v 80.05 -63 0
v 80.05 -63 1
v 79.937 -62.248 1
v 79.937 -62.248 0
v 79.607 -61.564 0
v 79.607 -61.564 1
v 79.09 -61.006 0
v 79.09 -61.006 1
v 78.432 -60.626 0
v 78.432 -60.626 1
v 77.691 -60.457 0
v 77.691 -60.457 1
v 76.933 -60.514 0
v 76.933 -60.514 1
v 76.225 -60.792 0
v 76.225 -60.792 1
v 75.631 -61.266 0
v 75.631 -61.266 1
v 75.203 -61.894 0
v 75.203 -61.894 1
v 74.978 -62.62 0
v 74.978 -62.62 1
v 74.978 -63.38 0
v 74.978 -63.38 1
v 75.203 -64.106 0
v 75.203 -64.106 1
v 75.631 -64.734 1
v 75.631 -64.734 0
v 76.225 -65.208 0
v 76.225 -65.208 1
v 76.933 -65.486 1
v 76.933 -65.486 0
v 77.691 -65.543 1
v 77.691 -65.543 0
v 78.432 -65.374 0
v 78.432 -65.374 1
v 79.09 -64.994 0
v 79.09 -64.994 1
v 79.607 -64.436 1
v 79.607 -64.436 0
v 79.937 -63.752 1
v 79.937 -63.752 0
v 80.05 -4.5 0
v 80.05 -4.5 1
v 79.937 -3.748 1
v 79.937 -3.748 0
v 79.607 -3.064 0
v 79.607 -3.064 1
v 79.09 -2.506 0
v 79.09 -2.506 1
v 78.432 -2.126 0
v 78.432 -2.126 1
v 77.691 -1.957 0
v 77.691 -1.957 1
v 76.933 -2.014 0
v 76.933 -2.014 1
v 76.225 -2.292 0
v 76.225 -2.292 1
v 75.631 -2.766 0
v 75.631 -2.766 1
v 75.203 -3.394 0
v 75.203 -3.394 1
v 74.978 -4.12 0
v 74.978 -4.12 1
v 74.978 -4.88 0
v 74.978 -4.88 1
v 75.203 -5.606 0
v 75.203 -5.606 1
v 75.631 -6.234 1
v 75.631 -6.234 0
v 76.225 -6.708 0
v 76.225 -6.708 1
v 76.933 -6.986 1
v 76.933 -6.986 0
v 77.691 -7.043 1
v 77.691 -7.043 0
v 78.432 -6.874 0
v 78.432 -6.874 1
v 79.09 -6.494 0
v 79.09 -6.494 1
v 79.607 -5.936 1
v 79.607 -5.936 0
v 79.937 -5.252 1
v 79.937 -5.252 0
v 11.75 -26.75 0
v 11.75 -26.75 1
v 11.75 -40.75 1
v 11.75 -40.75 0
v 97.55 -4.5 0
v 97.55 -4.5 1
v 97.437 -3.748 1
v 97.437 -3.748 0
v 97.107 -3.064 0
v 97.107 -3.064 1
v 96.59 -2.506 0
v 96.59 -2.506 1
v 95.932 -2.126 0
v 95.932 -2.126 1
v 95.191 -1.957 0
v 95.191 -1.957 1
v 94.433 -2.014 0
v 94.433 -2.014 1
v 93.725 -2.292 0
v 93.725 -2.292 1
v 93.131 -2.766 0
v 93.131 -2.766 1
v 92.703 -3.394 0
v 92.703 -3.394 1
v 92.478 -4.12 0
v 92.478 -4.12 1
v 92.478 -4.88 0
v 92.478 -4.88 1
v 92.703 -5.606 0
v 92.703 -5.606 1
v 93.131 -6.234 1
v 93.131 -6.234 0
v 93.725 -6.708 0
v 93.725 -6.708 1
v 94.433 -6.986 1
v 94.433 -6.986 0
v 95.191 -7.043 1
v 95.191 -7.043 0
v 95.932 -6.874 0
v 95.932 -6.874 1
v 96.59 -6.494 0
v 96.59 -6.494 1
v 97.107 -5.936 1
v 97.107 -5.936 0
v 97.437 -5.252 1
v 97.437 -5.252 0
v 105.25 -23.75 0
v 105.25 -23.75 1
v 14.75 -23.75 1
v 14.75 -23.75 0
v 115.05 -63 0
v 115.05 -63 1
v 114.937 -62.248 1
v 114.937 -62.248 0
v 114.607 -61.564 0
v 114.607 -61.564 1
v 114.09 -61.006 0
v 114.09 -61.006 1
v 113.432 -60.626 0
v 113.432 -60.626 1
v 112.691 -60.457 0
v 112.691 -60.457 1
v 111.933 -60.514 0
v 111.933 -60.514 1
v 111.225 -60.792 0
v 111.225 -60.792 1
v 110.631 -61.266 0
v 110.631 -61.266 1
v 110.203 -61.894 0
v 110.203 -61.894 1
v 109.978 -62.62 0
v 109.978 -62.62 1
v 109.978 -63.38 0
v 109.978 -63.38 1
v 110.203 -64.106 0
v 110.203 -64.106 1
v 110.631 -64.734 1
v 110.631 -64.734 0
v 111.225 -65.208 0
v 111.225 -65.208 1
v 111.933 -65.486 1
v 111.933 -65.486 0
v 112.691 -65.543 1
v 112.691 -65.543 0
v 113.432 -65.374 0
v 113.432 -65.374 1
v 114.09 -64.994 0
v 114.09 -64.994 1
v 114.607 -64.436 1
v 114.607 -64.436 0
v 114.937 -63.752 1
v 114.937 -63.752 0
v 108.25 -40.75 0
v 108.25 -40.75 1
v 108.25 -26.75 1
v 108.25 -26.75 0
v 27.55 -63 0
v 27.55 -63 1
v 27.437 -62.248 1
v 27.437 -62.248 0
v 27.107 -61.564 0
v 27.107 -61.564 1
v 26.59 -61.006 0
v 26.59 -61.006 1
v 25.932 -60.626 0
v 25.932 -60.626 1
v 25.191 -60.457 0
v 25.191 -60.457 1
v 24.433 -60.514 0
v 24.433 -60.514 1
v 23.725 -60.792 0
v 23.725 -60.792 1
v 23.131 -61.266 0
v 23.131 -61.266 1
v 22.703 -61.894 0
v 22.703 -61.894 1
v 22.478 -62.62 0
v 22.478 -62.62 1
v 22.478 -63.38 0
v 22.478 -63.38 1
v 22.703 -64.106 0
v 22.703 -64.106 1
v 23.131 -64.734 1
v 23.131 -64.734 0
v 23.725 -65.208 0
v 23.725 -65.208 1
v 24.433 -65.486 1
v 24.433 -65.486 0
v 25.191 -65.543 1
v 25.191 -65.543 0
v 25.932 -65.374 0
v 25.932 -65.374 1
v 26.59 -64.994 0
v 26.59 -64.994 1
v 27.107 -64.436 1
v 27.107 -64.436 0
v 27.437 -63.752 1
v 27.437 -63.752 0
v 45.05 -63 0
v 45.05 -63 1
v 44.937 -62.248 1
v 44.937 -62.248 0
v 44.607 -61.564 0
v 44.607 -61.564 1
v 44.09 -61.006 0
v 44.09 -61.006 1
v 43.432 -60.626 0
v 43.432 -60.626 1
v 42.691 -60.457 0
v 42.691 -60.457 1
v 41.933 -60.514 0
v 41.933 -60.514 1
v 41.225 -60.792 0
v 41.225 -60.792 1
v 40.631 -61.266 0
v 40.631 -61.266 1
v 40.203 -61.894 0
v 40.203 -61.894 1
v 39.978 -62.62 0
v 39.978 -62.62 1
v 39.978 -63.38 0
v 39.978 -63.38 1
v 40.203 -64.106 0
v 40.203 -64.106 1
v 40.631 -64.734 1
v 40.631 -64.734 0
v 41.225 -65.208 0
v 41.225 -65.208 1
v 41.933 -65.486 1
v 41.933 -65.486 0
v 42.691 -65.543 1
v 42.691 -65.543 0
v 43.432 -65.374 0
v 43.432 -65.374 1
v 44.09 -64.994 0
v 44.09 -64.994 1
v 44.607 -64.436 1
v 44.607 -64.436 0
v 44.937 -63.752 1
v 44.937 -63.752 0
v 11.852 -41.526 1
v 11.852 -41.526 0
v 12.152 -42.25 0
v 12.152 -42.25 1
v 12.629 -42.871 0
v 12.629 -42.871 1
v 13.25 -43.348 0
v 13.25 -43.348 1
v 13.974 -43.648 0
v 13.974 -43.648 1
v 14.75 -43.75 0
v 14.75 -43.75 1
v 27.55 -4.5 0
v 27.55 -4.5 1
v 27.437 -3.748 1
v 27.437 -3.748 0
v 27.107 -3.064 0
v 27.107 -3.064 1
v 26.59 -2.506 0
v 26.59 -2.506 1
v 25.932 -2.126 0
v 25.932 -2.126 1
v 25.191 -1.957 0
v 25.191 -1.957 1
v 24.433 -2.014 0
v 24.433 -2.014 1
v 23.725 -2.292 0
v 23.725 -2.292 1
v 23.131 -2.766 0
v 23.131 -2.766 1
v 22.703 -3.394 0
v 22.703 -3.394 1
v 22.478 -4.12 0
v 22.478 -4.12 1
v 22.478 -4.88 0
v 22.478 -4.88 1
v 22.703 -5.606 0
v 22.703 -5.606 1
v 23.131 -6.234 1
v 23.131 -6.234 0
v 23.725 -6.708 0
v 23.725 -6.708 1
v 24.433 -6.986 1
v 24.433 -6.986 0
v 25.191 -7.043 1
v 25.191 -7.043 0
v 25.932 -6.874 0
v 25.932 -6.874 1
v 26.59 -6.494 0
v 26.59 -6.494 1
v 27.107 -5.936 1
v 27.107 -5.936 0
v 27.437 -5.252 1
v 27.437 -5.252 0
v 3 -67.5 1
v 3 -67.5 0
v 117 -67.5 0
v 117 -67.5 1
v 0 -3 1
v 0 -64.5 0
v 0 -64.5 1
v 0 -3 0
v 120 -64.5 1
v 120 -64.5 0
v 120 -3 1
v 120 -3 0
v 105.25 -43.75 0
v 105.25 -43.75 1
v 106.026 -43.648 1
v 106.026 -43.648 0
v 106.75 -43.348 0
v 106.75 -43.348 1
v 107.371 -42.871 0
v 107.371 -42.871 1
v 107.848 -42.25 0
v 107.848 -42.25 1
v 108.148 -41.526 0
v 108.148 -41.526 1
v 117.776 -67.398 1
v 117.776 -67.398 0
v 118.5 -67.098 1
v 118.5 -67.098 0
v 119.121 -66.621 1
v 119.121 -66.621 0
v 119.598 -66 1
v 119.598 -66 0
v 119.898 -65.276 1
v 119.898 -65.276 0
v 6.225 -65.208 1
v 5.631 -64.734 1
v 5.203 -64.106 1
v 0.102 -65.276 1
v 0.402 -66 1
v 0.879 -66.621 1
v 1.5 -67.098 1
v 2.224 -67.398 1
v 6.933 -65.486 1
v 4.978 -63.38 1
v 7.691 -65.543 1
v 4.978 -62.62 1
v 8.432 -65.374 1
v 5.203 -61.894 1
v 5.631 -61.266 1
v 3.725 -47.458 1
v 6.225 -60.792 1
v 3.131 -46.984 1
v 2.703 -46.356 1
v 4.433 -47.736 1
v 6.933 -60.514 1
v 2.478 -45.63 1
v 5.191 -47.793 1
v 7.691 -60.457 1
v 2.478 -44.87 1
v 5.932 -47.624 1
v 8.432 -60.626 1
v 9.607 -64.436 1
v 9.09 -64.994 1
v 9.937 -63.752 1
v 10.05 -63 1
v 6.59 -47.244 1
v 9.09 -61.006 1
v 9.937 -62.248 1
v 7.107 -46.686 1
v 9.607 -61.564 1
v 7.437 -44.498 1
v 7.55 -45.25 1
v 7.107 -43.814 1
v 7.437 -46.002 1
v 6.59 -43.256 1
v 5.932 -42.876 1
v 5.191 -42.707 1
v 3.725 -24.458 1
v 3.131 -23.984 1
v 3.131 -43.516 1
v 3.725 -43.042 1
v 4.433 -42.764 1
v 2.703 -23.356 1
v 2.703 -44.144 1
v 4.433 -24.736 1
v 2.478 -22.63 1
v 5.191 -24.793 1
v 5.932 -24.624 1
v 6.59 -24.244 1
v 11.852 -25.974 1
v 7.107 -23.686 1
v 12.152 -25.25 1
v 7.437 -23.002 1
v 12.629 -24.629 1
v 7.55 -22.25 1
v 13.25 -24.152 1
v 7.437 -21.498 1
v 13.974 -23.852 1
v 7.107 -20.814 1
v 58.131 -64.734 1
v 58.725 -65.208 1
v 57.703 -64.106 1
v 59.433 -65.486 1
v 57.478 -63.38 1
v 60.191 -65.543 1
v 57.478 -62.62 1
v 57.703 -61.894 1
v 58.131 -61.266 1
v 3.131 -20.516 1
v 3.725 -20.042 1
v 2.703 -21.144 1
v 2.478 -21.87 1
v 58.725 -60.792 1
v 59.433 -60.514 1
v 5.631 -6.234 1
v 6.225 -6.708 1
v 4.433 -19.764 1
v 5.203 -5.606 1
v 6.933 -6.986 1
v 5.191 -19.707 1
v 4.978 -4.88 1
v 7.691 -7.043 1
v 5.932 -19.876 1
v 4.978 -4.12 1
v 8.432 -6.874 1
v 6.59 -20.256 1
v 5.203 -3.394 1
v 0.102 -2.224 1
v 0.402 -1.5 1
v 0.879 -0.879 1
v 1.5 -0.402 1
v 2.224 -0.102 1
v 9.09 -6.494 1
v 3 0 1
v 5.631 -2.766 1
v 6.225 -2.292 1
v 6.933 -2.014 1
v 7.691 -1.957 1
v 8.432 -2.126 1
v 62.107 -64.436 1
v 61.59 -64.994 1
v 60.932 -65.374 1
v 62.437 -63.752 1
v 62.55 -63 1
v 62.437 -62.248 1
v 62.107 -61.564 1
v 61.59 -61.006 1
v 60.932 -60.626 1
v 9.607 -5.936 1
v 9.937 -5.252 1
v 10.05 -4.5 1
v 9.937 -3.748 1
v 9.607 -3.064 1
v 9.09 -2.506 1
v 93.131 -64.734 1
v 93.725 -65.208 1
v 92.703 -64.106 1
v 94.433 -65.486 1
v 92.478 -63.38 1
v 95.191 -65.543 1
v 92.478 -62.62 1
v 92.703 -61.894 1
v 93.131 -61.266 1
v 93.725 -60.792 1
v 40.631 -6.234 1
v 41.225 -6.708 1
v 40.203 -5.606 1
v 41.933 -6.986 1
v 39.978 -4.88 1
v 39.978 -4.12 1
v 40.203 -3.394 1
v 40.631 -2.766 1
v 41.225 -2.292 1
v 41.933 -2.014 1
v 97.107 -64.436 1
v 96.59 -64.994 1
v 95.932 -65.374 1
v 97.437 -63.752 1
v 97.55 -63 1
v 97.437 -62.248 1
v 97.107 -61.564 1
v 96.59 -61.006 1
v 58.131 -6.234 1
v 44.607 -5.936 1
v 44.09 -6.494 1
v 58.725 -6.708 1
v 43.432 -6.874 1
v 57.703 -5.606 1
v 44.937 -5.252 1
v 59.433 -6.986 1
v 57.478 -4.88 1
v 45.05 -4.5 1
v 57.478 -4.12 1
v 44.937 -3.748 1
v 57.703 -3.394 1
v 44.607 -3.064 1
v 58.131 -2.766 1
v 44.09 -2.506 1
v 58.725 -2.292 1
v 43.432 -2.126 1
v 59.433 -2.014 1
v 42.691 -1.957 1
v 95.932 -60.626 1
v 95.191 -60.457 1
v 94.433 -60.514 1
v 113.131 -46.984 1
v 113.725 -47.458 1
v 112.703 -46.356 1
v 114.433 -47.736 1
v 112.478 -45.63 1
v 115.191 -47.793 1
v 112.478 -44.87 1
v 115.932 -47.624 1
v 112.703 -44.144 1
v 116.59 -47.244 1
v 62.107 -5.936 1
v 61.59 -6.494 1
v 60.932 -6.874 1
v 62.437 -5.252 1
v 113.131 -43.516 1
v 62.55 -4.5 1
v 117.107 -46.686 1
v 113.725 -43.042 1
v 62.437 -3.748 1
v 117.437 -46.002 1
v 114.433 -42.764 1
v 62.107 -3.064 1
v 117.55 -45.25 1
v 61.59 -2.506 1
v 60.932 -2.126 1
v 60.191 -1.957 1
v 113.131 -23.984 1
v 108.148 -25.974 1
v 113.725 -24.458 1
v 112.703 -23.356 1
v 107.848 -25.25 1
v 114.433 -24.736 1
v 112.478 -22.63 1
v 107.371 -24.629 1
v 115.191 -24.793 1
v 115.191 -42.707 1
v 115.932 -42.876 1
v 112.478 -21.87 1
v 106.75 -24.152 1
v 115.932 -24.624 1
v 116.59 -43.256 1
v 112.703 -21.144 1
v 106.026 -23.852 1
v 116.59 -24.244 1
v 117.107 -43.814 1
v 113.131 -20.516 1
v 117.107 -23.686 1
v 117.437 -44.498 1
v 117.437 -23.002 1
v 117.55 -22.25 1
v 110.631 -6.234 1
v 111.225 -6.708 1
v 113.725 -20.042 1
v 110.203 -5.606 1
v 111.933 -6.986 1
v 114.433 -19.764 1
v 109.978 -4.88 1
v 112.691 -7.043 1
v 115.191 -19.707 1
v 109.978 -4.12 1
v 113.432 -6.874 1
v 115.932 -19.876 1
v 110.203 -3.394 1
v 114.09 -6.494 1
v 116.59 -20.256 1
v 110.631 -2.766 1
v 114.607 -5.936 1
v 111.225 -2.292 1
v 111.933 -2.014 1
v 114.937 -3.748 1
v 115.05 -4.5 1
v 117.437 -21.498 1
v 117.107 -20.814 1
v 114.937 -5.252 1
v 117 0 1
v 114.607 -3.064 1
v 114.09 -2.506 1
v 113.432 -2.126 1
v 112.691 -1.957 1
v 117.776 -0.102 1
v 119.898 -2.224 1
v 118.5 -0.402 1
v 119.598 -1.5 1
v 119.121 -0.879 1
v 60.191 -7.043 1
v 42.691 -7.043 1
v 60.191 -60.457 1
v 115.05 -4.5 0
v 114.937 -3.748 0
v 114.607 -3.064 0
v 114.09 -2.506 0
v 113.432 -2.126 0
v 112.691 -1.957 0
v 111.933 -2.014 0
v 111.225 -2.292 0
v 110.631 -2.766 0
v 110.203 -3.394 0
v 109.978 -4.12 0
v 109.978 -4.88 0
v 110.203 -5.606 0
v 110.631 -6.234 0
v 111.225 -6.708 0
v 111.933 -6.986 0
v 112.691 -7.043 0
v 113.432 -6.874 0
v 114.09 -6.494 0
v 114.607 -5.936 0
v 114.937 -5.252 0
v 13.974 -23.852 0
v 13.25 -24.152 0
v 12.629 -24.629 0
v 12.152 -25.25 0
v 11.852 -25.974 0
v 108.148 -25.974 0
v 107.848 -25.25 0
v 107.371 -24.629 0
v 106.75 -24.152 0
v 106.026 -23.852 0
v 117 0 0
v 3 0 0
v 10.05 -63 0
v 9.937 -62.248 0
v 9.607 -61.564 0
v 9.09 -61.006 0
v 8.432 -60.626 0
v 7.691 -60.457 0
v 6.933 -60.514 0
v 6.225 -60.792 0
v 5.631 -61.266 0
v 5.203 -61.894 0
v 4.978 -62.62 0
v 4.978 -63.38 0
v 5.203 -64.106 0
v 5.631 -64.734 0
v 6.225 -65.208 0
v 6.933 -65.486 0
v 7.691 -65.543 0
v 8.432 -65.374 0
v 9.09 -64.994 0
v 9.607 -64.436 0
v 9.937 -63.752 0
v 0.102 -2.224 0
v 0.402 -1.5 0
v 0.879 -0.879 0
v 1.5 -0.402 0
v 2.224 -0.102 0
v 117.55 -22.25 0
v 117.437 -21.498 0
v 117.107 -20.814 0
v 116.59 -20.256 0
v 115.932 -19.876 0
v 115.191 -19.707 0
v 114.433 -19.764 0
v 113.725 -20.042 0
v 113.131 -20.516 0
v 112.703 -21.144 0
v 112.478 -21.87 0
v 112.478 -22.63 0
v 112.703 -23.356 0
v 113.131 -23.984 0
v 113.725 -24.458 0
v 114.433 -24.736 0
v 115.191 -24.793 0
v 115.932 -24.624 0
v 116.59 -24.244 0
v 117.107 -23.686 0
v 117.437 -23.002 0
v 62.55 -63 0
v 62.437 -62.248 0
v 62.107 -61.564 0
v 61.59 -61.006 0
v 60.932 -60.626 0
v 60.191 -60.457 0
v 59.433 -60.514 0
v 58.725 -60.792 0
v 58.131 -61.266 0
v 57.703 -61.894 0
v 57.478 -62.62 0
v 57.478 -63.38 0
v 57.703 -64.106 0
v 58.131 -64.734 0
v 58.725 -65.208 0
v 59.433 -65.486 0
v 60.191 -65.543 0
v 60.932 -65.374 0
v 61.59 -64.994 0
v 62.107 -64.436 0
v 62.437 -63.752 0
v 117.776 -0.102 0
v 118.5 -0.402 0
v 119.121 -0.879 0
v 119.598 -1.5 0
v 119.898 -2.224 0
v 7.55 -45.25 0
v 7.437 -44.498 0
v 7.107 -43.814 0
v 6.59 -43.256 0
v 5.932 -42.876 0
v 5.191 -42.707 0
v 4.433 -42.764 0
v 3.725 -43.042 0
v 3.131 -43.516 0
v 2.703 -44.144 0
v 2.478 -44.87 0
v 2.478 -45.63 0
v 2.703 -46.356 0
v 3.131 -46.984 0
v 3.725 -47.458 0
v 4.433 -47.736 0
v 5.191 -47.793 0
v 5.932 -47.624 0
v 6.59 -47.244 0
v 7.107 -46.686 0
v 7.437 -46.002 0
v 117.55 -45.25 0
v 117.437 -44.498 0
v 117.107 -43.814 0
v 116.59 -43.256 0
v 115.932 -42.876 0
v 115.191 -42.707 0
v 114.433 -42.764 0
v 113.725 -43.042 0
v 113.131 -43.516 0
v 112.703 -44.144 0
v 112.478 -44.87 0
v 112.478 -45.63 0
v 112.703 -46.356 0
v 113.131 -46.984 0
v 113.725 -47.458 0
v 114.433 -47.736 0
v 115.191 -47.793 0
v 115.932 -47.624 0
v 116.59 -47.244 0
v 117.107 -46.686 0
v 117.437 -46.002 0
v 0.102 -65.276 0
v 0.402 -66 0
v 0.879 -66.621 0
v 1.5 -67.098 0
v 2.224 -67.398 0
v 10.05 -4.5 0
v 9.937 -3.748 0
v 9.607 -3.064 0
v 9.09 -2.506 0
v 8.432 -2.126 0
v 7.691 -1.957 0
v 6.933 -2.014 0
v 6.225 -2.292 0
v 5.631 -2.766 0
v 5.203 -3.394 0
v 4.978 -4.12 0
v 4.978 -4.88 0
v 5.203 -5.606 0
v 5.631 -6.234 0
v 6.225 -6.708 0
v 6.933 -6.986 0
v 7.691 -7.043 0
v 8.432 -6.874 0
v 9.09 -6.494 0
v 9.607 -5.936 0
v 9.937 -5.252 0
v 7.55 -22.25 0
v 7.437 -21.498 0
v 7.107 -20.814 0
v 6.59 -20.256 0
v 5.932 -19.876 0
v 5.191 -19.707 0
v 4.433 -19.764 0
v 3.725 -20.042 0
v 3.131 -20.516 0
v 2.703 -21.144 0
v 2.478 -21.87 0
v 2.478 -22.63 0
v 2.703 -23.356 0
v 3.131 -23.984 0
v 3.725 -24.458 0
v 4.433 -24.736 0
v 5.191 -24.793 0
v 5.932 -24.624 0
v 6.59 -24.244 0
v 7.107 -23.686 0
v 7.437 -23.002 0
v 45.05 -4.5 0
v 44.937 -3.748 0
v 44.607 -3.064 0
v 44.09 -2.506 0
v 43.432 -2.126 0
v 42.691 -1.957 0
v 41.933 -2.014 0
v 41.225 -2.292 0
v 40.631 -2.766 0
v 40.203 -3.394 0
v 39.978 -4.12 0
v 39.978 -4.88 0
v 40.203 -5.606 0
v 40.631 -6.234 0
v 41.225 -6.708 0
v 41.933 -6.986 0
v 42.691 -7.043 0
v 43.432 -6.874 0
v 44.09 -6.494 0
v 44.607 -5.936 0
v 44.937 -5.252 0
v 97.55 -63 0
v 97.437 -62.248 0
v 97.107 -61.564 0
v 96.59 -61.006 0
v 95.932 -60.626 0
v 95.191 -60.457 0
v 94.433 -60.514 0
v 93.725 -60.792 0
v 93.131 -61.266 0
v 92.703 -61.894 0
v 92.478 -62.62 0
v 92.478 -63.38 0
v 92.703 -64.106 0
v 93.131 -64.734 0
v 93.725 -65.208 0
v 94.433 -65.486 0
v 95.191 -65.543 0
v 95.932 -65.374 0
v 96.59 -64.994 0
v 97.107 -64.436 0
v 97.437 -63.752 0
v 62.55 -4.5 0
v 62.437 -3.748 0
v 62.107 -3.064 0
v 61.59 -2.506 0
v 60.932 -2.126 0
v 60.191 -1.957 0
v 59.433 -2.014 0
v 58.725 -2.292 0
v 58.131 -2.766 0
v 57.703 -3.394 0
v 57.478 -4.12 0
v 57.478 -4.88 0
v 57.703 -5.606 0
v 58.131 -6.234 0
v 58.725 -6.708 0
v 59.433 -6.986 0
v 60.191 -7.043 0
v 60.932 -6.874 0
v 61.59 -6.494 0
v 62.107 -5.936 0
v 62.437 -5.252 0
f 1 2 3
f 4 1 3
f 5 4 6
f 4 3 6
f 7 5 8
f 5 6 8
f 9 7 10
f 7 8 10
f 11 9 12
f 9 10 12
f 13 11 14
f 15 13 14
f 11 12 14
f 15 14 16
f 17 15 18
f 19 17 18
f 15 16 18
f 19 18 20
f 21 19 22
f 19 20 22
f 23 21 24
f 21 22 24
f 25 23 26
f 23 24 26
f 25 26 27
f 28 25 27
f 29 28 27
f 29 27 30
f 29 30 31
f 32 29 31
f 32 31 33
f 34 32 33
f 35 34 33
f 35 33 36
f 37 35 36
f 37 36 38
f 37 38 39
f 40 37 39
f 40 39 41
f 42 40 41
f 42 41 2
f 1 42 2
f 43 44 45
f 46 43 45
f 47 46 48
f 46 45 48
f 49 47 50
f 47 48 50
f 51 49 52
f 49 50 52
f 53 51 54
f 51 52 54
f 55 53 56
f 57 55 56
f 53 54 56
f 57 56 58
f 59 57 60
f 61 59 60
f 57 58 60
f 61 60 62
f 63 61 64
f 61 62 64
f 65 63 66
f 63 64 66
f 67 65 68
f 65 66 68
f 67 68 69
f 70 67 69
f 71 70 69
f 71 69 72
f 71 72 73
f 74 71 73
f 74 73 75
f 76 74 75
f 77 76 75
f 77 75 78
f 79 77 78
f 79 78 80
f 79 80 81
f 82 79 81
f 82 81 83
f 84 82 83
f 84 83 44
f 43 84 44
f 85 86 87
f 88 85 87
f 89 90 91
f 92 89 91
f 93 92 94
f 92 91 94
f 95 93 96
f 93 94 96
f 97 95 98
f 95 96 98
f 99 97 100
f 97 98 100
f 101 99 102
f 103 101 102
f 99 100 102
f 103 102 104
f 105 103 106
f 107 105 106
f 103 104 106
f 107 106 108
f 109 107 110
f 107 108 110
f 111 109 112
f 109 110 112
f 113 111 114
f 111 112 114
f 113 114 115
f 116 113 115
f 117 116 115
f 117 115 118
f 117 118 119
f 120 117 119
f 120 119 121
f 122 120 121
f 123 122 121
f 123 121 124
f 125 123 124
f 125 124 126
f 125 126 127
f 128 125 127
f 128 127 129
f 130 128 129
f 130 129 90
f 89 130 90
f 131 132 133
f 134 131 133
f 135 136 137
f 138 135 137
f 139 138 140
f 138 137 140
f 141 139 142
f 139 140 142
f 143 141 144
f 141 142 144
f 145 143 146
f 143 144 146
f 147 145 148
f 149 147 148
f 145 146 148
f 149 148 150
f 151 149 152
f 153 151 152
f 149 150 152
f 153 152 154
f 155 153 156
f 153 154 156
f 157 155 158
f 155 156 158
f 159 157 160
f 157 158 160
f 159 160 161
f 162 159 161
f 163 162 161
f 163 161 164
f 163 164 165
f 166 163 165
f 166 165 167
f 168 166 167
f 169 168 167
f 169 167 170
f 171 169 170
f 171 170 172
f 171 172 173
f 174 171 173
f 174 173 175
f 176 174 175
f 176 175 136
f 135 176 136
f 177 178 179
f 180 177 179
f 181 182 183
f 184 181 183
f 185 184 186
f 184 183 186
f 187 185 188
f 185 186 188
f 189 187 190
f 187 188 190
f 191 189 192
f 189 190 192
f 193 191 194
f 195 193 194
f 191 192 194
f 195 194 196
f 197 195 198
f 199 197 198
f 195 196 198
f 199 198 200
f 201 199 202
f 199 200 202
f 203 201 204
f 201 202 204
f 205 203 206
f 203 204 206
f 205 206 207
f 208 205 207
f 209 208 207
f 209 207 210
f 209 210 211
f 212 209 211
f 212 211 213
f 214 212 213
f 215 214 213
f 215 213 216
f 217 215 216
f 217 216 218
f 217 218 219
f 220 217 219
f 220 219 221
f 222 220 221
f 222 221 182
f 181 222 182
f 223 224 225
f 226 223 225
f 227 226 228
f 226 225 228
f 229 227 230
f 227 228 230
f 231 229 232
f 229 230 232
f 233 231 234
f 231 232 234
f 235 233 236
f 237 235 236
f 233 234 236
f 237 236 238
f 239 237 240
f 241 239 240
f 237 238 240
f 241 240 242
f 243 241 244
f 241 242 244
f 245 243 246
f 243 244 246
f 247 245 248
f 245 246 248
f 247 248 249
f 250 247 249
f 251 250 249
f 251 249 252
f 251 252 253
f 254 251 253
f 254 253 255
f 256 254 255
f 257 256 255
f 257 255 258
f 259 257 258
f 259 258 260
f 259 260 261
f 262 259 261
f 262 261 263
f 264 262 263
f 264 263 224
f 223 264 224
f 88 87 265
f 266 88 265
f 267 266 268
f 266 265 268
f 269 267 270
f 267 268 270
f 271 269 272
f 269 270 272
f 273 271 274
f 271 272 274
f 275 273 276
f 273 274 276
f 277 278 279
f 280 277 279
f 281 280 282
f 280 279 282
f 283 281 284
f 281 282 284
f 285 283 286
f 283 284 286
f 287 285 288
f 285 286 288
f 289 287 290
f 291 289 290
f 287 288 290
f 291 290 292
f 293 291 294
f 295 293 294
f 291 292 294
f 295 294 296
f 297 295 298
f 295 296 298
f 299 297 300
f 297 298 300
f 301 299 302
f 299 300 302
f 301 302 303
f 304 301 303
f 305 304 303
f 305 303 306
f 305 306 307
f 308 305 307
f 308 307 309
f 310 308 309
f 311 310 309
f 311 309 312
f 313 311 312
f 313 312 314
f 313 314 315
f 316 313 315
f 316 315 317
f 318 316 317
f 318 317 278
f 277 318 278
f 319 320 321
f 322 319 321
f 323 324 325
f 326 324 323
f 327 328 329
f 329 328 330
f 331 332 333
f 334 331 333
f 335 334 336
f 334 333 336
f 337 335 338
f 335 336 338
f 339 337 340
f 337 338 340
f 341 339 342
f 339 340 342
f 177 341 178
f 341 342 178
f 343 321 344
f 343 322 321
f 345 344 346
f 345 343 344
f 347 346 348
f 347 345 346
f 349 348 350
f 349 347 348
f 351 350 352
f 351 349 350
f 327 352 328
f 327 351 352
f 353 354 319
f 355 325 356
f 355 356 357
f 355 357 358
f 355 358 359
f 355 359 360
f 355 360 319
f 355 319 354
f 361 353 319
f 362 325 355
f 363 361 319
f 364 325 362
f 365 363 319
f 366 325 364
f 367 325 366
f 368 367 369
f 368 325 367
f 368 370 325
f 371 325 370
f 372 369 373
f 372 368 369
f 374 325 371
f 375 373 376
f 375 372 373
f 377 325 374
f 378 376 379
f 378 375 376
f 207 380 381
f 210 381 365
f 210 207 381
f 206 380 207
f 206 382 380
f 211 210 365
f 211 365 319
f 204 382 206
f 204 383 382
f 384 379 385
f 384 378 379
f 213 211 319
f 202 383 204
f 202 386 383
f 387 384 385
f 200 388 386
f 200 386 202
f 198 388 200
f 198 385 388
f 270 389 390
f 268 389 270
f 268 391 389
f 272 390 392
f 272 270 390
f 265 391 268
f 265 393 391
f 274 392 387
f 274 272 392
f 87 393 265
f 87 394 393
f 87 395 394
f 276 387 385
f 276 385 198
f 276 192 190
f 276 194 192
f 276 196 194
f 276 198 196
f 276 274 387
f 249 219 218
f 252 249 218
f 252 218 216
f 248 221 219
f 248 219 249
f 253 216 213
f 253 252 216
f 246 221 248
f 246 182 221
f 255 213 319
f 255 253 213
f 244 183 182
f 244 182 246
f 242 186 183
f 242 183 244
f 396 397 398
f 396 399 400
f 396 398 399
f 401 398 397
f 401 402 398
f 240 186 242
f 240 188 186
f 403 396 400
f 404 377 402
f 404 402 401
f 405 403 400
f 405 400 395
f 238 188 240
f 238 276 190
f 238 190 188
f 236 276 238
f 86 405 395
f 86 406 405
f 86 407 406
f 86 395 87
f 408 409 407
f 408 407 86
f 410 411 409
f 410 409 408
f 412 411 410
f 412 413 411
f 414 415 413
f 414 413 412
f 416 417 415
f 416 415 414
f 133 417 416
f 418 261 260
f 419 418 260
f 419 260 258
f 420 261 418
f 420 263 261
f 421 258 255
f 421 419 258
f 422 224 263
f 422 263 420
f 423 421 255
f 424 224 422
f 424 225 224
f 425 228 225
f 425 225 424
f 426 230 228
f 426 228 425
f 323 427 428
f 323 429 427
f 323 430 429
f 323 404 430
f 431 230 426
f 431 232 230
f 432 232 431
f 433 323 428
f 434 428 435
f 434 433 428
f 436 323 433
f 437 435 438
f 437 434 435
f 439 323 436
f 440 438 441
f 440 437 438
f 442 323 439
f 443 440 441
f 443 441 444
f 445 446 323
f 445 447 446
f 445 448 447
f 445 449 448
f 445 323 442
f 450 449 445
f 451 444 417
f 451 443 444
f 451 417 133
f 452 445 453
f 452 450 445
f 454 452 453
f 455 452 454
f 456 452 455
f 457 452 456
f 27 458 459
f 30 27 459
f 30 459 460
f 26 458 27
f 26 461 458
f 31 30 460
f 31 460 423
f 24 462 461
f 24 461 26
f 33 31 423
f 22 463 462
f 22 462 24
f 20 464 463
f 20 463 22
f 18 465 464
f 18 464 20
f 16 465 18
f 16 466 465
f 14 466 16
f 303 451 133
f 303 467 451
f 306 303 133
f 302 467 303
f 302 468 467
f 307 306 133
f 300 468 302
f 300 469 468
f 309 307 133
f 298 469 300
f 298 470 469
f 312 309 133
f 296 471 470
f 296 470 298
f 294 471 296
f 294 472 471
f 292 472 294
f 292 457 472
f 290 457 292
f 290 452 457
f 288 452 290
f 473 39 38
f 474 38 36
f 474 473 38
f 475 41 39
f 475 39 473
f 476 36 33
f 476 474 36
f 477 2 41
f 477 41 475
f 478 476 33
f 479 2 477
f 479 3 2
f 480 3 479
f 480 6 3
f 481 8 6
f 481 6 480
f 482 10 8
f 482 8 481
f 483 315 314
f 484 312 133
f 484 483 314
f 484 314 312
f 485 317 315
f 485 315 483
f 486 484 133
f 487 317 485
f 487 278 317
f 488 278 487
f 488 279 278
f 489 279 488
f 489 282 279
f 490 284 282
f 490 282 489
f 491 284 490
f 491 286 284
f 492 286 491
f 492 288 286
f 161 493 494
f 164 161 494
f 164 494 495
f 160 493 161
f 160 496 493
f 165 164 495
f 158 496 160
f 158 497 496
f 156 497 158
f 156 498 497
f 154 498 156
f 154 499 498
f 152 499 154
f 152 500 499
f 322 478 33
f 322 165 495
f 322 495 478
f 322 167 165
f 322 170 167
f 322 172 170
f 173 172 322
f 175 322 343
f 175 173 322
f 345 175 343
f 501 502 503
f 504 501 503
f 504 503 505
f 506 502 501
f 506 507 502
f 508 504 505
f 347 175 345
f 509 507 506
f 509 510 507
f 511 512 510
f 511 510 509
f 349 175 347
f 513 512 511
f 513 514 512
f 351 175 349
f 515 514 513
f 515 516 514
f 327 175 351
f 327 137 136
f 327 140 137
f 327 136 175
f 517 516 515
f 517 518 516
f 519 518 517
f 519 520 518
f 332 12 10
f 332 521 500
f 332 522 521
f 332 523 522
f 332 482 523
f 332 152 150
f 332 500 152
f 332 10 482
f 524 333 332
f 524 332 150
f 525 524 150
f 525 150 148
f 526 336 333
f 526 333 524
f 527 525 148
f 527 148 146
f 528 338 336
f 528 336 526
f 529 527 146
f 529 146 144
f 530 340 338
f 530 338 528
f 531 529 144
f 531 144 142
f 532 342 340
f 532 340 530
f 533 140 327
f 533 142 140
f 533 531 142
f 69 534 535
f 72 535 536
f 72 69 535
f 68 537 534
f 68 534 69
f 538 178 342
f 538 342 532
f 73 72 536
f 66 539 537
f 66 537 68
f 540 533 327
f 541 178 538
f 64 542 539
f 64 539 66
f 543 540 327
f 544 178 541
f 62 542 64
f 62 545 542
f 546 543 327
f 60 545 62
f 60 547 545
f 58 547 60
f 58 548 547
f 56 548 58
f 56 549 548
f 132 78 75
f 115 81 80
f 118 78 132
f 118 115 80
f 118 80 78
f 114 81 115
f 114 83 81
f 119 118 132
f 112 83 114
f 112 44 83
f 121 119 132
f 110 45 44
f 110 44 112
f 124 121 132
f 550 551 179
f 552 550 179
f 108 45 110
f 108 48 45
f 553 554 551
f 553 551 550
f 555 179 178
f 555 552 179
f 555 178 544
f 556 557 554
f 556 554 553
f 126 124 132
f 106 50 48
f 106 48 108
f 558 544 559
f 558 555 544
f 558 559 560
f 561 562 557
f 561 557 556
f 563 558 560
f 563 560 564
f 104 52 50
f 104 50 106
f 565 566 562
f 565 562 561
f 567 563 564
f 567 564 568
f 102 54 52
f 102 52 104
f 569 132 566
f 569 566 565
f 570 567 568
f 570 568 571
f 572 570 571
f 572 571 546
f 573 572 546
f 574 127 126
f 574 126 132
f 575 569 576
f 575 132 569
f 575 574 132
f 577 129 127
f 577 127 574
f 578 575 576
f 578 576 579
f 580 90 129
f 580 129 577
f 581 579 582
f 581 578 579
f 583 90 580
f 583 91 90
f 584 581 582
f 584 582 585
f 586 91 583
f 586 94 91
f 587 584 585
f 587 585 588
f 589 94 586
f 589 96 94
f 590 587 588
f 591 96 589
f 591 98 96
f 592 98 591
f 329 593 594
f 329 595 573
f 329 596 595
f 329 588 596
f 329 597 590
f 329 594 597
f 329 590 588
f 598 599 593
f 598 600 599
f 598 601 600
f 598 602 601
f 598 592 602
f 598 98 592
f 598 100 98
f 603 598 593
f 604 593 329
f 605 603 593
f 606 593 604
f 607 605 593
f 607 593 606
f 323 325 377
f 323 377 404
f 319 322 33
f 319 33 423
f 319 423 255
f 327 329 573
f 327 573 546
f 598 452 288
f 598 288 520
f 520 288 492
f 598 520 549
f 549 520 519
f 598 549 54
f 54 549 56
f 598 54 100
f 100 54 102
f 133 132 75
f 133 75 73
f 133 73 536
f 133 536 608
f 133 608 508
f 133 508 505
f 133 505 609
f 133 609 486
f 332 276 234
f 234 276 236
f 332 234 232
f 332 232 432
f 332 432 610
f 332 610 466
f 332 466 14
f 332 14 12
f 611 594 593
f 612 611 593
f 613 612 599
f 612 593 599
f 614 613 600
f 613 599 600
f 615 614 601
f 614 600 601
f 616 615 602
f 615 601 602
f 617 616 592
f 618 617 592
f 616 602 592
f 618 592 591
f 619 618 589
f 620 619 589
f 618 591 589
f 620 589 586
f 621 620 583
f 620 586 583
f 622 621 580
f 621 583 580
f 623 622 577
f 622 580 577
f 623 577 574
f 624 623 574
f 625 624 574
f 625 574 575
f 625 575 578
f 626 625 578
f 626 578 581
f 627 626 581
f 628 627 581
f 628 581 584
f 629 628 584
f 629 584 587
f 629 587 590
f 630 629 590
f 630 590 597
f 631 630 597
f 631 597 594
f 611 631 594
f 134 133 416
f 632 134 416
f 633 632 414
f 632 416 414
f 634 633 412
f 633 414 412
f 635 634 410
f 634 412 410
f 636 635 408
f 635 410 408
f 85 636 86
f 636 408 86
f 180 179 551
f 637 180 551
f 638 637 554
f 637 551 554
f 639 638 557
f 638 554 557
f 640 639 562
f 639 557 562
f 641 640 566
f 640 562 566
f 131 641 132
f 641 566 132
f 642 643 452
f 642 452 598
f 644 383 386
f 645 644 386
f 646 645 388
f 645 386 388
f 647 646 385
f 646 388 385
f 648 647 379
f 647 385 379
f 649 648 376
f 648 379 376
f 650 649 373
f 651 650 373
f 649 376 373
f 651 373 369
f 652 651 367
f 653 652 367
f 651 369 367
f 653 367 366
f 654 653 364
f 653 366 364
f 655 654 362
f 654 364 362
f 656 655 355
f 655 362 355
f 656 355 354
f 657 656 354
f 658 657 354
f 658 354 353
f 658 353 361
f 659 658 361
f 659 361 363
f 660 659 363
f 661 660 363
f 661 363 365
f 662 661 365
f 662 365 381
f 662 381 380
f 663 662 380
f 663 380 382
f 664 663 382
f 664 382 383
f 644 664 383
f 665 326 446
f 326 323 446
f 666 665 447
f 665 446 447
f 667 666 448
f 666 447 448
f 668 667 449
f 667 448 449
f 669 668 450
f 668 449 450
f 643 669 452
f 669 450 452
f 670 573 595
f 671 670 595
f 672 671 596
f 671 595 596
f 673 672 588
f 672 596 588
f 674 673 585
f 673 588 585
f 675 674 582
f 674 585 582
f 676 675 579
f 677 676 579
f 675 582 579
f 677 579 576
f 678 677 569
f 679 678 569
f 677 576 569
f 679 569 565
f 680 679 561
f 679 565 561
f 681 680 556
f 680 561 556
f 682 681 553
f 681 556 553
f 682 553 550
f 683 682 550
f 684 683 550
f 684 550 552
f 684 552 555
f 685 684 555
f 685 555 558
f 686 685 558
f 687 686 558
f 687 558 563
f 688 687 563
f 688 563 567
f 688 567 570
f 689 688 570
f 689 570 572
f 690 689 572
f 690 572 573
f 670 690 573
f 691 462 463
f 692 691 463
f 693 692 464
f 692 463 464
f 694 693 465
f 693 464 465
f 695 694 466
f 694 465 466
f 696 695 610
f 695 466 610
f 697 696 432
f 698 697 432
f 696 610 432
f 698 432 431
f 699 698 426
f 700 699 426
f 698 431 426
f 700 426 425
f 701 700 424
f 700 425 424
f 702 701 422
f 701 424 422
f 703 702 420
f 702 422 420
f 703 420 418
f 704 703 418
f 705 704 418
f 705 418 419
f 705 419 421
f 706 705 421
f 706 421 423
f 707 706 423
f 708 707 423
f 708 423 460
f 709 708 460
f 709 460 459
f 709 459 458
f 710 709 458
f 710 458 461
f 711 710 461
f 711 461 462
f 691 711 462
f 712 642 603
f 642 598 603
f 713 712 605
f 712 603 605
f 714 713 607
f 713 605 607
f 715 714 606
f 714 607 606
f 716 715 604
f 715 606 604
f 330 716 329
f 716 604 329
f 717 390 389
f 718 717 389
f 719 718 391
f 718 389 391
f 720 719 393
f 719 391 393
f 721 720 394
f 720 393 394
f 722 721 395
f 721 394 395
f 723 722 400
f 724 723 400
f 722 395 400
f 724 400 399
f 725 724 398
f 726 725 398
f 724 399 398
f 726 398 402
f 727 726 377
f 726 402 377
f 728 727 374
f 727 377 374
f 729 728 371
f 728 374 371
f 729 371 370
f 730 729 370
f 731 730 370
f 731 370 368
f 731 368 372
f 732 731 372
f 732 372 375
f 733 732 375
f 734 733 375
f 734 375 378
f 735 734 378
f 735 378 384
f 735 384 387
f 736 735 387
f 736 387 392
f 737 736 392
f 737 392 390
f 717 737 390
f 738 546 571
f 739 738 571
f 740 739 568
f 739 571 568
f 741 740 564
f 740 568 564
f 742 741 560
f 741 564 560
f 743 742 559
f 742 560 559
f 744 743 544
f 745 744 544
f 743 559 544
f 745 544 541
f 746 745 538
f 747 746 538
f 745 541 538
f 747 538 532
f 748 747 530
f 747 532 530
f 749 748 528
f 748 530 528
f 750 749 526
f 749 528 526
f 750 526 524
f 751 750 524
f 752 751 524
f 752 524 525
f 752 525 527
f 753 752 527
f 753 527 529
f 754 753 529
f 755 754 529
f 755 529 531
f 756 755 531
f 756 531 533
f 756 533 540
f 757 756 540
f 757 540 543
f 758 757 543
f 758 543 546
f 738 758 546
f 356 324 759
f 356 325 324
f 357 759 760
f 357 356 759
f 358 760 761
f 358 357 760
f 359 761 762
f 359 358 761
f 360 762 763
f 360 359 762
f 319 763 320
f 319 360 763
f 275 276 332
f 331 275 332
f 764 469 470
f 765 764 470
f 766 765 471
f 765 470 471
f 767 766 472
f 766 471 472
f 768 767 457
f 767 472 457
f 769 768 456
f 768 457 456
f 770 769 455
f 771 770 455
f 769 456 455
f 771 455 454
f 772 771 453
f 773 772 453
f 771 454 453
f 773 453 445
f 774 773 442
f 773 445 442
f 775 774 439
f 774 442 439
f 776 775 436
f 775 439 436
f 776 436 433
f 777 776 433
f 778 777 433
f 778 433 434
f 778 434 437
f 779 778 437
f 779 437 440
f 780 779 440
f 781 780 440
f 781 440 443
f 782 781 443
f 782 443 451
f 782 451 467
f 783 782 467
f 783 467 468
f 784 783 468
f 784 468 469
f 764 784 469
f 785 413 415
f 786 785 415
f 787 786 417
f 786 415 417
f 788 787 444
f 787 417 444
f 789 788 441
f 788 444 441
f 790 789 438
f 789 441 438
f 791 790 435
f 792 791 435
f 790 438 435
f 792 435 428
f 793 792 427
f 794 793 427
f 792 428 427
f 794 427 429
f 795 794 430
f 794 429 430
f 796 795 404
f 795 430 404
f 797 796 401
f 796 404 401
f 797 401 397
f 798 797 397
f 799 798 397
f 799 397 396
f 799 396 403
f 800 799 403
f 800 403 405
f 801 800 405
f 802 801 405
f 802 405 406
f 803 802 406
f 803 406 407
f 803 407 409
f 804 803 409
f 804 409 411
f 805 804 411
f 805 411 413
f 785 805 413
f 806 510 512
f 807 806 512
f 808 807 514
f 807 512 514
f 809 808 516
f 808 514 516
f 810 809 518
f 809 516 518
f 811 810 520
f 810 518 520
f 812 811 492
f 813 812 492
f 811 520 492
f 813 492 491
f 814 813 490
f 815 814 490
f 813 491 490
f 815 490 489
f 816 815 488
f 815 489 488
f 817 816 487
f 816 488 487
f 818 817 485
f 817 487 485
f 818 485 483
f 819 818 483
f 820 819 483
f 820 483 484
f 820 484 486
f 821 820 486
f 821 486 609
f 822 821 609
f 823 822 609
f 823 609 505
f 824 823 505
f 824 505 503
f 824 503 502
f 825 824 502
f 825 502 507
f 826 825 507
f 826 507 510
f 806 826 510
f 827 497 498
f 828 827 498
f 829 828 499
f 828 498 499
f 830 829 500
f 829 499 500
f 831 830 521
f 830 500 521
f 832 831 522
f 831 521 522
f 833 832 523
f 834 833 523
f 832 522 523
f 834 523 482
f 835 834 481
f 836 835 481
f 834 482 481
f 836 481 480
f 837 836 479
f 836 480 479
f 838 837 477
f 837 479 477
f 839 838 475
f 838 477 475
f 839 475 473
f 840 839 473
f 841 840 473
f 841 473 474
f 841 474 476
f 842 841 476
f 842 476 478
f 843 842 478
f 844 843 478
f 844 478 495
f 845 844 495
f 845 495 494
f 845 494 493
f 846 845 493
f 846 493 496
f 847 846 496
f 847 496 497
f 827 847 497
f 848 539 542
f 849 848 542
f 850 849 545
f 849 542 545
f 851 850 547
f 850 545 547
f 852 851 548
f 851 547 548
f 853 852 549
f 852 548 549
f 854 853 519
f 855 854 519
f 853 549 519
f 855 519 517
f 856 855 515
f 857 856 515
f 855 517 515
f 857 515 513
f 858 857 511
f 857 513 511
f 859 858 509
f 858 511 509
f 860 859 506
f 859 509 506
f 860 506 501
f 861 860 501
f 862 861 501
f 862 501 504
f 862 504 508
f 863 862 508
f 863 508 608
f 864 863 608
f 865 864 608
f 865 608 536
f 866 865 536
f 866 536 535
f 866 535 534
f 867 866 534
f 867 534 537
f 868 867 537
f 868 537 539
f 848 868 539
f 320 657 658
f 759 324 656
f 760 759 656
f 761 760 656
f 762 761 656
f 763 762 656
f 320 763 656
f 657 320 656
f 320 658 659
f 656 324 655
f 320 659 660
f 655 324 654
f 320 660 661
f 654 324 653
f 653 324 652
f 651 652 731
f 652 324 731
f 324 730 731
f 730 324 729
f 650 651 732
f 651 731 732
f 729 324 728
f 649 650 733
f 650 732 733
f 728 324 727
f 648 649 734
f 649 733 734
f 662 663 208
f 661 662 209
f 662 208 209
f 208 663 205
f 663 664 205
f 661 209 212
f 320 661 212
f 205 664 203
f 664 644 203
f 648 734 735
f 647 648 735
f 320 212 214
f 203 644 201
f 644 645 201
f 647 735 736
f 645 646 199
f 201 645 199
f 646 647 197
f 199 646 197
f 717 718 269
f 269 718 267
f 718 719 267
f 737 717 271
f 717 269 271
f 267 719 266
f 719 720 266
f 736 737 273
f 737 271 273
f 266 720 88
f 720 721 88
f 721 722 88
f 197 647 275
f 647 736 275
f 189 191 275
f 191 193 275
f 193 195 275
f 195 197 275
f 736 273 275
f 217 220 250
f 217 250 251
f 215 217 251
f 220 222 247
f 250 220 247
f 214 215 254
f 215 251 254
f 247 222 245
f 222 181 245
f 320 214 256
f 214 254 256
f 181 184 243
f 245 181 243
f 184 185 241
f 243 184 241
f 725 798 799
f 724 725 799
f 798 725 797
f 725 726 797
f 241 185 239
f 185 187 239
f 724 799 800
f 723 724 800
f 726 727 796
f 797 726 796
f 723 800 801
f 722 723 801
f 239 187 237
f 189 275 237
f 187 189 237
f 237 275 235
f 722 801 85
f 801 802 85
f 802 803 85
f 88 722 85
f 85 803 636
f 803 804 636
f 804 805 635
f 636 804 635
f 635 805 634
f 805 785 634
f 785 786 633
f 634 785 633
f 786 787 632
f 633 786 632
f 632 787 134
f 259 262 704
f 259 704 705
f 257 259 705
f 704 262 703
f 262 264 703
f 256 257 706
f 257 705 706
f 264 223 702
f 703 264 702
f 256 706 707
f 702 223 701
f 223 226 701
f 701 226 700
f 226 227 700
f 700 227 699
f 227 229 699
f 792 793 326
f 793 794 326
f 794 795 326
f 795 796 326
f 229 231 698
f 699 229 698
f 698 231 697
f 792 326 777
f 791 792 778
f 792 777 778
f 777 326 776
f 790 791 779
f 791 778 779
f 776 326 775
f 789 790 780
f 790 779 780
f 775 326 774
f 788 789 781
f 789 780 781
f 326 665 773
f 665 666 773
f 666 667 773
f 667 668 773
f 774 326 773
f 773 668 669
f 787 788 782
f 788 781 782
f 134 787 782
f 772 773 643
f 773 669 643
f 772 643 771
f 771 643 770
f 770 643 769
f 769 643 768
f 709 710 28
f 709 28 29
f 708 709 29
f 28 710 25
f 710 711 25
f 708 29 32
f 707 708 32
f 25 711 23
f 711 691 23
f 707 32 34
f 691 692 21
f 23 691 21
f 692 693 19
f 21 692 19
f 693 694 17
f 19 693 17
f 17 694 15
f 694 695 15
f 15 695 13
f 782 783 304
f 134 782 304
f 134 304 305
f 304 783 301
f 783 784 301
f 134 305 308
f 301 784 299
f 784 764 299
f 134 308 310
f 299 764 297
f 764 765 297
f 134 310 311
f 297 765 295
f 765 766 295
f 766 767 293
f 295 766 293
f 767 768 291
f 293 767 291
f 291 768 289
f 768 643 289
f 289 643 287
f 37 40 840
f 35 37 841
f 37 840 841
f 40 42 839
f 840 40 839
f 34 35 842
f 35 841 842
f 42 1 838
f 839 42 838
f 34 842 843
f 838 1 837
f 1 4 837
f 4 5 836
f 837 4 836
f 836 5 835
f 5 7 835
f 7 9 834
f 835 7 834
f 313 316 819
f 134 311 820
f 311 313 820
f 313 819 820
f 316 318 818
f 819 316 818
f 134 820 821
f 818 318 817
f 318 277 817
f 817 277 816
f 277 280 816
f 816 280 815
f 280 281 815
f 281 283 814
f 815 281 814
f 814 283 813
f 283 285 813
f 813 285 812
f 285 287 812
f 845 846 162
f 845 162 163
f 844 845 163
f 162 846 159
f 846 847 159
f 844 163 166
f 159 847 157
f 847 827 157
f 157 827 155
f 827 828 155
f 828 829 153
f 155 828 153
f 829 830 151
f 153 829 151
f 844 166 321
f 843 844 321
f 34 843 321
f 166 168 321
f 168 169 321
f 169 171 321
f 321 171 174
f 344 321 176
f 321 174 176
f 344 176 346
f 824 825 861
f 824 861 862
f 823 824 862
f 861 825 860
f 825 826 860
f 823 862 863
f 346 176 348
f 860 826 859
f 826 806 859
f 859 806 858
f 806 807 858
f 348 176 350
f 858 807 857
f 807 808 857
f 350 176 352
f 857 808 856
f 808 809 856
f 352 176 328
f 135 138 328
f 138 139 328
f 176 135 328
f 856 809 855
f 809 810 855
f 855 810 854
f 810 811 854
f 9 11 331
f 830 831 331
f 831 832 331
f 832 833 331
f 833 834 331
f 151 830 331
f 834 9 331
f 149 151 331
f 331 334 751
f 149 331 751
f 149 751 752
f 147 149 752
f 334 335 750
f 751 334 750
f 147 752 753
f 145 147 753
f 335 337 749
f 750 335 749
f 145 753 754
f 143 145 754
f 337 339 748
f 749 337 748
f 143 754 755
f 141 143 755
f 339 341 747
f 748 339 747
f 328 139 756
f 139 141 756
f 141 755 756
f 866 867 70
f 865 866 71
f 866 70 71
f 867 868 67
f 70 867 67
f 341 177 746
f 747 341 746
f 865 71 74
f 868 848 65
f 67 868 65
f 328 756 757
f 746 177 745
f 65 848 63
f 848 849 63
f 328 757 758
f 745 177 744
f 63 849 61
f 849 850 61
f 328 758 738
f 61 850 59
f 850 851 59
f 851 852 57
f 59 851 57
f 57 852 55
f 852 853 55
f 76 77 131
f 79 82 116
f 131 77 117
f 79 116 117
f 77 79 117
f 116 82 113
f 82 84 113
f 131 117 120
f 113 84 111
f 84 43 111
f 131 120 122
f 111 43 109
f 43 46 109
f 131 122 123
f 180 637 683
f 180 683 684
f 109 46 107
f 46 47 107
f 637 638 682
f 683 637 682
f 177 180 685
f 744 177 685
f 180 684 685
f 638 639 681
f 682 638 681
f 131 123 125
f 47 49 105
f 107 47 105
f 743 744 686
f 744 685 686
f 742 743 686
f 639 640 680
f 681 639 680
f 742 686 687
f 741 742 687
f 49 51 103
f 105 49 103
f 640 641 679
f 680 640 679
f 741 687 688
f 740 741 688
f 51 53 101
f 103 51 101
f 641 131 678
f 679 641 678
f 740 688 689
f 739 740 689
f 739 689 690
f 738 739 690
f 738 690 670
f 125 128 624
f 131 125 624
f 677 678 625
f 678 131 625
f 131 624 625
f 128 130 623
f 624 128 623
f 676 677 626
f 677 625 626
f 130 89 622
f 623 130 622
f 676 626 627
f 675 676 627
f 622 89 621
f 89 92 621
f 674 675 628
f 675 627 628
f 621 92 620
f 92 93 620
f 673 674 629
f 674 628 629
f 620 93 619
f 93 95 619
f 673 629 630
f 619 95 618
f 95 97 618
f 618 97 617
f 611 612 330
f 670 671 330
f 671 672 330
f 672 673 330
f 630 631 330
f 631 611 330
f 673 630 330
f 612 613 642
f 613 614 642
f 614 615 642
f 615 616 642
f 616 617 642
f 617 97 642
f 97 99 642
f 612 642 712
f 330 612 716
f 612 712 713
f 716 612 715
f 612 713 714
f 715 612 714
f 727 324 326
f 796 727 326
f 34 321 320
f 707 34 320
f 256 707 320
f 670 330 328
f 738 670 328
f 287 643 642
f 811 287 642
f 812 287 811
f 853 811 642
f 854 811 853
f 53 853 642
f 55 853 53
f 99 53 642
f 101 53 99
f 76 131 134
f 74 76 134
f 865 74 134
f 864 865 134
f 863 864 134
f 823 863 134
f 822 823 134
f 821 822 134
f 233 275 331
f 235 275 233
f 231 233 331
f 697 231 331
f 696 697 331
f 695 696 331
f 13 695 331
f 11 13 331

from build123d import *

# Parameters (mm, degrees)
F0_W     = 120
F0_H     = 67.5
F1_DEPTH = 1
F2_R     = 2.55
F3_DEPTH = 25
F4_R     = 3
F5_R     = 2.55
F6_DEPTH = 25


with BuildPart() as f1:
    # F0 (on Top) → F1 (new body)
    with BuildSketch(Plane.XY):
        with Locations((60, -33.75)):
            Rectangle(F0_W, F0_H)
    extrude(amount=F1_DEPTH)

    # F2 (on face) → F3 (cut)
    with BuildSketch(Plane.XY.offset(1)):
        with BuildLine():
            Line((105.25, -23.75), (14.75, -23.75))
            ThreePointArc((14.75, -23.75), (12.62868, -24.62868), (11.75, -26.75))
            Line((11.75, -26.75), (11.75, -40.75))
            ThreePointArc((11.75, -40.75), (12.62868, -42.87132), (14.75, -43.75))
            Line((14.75, -43.75), (105.25, -43.75))
            ThreePointArc((105.25, -43.75), (107.37132, -42.87132), (108.25, -40.75))
            Line((108.25, -40.75), (108.25, -26.75))
            ThreePointArc((108.25, -26.75), (107.37132, -24.62868), (105.25, -23.75))
        make_face()
        with Locations((7.5, -4.5)):
            Circle(F2_R)
        with Locations((7.5, -63)):
            Circle(F2_R)
        with Locations((25, -4.5)):
            Circle(F2_R)
        with Locations((25, -63)):
            Circle(F2_R)
        with Locations((42.5, -4.5)):
            Circle(F2_R)
        with Locations((42.5, -63)):
            Circle(F2_R)
        with Locations((60, -4.5)):
            Circle(F2_R)
        with Locations((60, -63)):
            Circle(F2_R)
        with Locations((77.5, -4.5)):
            Circle(F2_R)
        with Locations((77.5, -63)):
            Circle(F2_R)
        with Locations((95, -4.5)):
            Circle(F2_R)
        with Locations((95, -63)):
            Circle(F2_R)
        with Locations((112.5, -4.5)):
            Circle(F2_R)
        with Locations((112.5, -63)):
            Circle(F2_R)
    extrude(amount=-F3_DEPTH, mode=Mode.SUBTRACT)

    # F4
    f4_edges = [f1.edges().sort_by_distance(p)[0] for p in [
        (0, 0, 0.5),
        (0, -67.5, 0.5),
        (120, 0, 0.5),
        (120, -67.5, 0.5),
    ]]
    fillet(f4_edges, radius=F4_R)

    # F5 (on face) → F6 (cut)
    with BuildSketch(Plane.XY.offset(1)):
        with Locations((115, -45.25)):
            Circle(F5_R)
        with Locations((115, -22.25)):
            Circle(F5_R)
        with Locations((5, -45.25)):
            Circle(F5_R)
        with Locations((5, -22.25)):
            Circle(F5_R)
    extrude(amount=-F6_DEPTH, mode=Mode.SUBTRACT)


solid = f1.part
